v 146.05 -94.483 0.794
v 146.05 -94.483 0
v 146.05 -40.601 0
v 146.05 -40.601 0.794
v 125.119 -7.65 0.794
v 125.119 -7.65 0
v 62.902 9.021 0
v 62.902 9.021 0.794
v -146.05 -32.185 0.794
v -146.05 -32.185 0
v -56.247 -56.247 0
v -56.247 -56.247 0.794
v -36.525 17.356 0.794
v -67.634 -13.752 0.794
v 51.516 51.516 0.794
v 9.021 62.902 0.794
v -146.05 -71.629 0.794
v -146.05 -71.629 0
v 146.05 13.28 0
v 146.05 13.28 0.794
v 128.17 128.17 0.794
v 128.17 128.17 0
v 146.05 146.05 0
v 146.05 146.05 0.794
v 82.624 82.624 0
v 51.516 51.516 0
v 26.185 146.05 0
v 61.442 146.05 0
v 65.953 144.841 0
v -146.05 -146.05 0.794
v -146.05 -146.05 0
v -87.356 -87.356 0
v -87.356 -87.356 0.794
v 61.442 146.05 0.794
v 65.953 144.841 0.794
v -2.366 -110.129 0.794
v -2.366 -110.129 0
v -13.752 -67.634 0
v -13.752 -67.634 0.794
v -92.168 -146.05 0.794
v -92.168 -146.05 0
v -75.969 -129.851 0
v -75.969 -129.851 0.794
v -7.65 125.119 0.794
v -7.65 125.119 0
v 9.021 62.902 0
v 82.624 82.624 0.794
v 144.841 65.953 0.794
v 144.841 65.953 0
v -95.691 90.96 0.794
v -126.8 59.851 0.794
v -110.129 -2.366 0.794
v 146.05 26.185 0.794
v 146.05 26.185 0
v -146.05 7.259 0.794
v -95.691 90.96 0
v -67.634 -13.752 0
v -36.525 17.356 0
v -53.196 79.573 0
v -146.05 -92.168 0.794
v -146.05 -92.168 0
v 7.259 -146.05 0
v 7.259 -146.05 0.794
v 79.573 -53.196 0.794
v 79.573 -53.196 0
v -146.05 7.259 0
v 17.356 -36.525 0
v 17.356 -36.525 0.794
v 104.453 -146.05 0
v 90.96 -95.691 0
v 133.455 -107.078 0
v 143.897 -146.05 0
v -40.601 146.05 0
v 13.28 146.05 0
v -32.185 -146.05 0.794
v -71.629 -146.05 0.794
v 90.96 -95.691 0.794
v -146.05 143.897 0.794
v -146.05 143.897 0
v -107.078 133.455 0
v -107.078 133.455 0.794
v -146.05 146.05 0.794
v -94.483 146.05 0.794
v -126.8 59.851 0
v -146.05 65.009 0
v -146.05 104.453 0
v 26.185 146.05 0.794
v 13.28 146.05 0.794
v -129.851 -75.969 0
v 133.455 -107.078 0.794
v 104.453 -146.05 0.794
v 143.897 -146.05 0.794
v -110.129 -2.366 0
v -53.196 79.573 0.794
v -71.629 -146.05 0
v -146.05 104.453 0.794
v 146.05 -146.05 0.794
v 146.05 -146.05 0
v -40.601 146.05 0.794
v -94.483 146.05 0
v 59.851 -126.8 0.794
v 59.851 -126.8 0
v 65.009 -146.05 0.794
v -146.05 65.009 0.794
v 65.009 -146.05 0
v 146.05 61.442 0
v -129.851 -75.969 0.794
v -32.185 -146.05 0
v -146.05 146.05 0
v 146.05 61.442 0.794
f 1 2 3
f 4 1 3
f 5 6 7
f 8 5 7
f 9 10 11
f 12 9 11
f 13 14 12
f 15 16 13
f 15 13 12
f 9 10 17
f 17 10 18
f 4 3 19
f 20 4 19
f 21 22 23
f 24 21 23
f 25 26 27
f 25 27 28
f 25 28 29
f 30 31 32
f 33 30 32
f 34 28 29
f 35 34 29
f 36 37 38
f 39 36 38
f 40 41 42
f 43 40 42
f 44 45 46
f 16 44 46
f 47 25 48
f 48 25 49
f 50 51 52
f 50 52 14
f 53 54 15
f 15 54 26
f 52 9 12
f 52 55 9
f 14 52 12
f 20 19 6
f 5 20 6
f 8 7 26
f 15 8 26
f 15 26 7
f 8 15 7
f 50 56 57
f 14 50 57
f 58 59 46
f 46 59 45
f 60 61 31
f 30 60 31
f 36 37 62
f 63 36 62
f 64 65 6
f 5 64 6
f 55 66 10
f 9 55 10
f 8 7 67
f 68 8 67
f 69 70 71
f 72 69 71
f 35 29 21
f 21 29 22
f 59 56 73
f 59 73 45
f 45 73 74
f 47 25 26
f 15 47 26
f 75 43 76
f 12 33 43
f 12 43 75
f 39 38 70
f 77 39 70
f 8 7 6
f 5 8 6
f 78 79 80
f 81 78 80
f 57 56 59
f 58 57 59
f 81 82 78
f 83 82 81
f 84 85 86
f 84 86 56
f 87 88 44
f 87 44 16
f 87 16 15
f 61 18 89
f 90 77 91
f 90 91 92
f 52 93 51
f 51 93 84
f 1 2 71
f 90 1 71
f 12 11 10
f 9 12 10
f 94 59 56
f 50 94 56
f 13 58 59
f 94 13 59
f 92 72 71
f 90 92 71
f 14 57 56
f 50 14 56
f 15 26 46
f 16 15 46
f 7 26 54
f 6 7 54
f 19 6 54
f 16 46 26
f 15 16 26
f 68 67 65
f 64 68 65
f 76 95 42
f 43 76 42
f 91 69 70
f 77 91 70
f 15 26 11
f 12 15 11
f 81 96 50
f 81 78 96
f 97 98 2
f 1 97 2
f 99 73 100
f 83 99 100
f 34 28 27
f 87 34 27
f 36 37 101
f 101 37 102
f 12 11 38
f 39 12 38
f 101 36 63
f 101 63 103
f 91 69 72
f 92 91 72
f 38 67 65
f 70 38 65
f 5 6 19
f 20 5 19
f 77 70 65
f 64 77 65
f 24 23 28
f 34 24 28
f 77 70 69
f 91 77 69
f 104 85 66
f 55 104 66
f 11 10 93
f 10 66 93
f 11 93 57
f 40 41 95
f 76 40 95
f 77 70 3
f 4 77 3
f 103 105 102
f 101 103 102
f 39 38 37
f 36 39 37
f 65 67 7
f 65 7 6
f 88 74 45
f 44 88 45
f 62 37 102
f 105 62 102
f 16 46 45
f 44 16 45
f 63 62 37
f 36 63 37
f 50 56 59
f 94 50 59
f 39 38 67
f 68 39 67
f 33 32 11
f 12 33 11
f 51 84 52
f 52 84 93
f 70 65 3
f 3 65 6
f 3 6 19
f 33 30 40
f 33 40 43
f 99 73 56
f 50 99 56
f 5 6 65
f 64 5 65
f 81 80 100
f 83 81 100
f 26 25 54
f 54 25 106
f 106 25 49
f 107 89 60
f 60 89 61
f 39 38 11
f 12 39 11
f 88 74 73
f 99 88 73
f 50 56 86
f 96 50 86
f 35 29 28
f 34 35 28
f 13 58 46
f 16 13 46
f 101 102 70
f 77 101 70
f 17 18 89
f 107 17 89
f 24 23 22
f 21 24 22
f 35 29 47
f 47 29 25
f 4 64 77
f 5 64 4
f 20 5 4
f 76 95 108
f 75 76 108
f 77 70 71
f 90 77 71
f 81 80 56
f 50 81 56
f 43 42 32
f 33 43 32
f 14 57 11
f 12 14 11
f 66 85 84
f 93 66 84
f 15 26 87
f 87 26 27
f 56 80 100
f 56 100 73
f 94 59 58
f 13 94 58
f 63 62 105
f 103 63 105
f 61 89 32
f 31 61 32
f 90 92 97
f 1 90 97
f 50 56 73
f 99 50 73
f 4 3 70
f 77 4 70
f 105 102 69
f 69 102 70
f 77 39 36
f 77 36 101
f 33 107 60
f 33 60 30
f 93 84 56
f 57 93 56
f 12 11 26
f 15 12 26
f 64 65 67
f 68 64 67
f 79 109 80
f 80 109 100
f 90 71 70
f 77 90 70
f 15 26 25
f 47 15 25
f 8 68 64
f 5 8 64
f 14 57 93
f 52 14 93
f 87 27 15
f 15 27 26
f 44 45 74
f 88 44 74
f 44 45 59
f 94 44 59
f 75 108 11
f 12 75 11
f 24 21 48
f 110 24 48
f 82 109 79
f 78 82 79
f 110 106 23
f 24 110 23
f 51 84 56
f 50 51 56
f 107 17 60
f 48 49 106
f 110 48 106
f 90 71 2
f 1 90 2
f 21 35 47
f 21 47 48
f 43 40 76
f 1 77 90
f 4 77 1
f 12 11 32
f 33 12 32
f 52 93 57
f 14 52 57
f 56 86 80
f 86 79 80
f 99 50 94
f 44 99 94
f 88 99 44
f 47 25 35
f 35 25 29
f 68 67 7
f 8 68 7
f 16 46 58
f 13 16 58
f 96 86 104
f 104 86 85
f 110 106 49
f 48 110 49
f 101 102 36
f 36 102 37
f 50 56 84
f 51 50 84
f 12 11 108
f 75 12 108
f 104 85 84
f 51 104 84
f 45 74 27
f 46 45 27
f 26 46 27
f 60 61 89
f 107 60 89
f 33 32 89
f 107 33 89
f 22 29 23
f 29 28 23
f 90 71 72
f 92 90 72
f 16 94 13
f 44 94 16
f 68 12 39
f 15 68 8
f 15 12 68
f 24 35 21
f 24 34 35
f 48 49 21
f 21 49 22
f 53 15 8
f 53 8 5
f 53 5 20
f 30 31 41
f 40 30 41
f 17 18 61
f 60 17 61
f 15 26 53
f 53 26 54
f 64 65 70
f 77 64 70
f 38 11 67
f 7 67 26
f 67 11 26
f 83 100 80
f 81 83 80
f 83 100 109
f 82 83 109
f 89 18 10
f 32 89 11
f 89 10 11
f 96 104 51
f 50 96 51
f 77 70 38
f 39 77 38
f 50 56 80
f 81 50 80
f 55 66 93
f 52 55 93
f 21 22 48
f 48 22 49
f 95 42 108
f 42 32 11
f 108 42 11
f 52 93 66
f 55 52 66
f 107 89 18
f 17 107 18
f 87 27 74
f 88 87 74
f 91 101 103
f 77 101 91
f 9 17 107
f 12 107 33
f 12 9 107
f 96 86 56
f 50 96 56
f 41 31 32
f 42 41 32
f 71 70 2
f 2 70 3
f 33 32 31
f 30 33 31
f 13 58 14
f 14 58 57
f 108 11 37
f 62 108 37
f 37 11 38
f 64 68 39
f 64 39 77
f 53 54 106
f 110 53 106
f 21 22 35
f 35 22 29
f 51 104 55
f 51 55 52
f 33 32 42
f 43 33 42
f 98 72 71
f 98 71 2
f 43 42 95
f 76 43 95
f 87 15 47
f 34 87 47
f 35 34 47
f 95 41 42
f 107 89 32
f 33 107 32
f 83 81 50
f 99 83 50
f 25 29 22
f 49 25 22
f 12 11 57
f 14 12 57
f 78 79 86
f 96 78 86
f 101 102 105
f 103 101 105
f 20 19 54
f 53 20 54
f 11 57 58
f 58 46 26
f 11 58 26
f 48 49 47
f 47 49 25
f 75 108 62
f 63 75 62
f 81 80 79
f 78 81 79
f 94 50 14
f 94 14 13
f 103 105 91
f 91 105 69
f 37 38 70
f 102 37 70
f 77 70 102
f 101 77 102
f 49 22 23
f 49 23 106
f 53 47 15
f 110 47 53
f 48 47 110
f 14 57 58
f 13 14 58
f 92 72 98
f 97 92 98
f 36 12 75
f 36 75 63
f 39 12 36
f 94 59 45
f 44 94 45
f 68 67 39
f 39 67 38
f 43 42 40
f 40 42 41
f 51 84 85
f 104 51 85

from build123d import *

# Parameters (mm, degrees)
F1_DEPTH = 0.79375
F2_DEPTH = 0.79375
F3_DEPTH = 0.79375


with BuildPart() as f1:
    # F0 (on Top) → F1 (new body)
    with BuildSketch(Plane.XY):
        Polygon((-7.6503990469, 125.1191826267), (13.2804183263, 146.05), (-40.6011184001, 146.05), (-95.6914612629, 90.9596571371), (-53.1964330331, 79.5731486406), align=None)
    extrude(amount=F1_DEPTH)


with BuildPart() as f1b:
    # F0 (on Top) → F1, piece 2 (new body)
    with BuildSketch(Plane.XY):
        Polygon((-67.6339472858, -13.7524105594), (-95.6914612629, 90.9596571371), (-126.7999809963, 59.8511374038), (-110.1289755157, -2.3659020629), align=None)
    extrude(amount=F1_DEPTH)


with BuildPart() as f1c:
    # F0 (on Top) → F1, piece 3 (new body)
    with BuildSketch(Plane.XY):
        Polygon((-146.05, 104.4531869238), (-95.6914612629, 90.9596571371), (-107.0779697595, 133.454685367), (-146.05, 143.8972093974), align=None)
    extrude(amount=F1_DEPTH)


with BuildPart() as f1d:
    # F0 (on Top) → F1, piece 4 (new body)
    with BuildSketch(Plane.XY):
        Polygon((-75.9694500261, -129.8509867525), (-87.3559585227, -87.3559585227), (-146.05, -146.05), (-92.1684632736, -146.05), align=None)
    extrude(amount=F1_DEPTH)


with BuildPart() as f1e:
    # F0 (on Top) → F1, piece 5 (new body)
    with BuildSketch(Plane.XY):
        Polygon((17.3561091739, -36.5254275525), (-13.7524105594, -67.6339472858), (90.9596571371, -95.6914612629), (79.5731486406, -53.1964330331), align=None)
    extrude(amount=F1_DEPTH)


with BuildPart() as f1f:
    # F0 (on Top) → F1, piece 6 (new body)
    with BuildSketch(Plane.XY):
        Polygon((146.05, -94.4826551265), (146.05, -40.6011184001), (90.9596571371, -95.6914612629), (133.454685367, -107.0779697595), align=None)
    extrude(amount=F1_DEPTH)


with BuildPart() as f1g:
    # F0 (on Top) → F1, piece 7 (new body)
    with BuildSketch(Plane.XY):
        Polygon((104.4531869238, -146.05), (90.9596571371, -95.6914612629), (59.8511374038, -126.7999809963), (65.0091644501, -146.05), align=None)
    extrude(amount=F1_DEPTH)


with BuildPart() as f1h:
    # F0 (on Top) → F1, piece 8 (new body)
    with BuildSketch(Plane.XY):
        Polygon((-56.2474387893, -56.2474387893), (51.5156346635, 51.5156346635), (9.0206064336, 62.9021431601), (-36.5254275525, 17.3561091739), (-67.6339472858, -13.7524105594), align=None)
    extrude(amount=F1_DEPTH)


with BuildPart() as f1i:
    # F0 (on Top) → F1, piece 9 (new body)
    with BuildSketch(Plane.XY):
        Polygon((-13.7524105594, -67.6339472858), (-56.2474387893, -56.2474387893), (-32.1849150347, -146.05), (7.259107439, -146.05), (-2.3659020629, -110.1289755157), align=None)
    extrude(amount=F1_DEPTH)


with BuildPart() as f1j:
    # F0 (on Top) → F1, piece 10 (new body)
    with BuildSketch(Plane.XY):
        Polygon((-87.3559585227, -87.3559585227), (-56.2474387893, -56.2474387893), (-146.05, -32.1849150347), (-146.05, -71.6289375083), (-129.8509867525, -75.9694500261), align=None)
    extrude(amount=F1_DEPTH)


with BuildPart() as f1k:
    # F0 (on Top) → F1, piece 11 (new body)
    with BuildSketch(Plane.XY):
        Polygon((146.05, 13.2804183263), (146.05, 26.1852278146), (51.5156346635, 51.5156346635), (62.9021431601, 9.0206064336), (125.1191826267, -7.6503990469), align=None)
    extrude(amount=F1_DEPTH)


with BuildPart() as f1l:
    # F0 (on Top) → F1, piece 12 (new body)
    with BuildSketch(Plane.XY):
        Polygon((65.9531489163, 144.8411938636), (61.4418229986, 146.05), (26.1852278146, 146.05), (51.5156346635, 51.5156346635), (82.6241543969, 82.6241543969), align=None)
    extrude(amount=F1_DEPTH)


with BuildPart() as f1m:
    # F0 (on Top) → F1, piece 13 (new body)
    with BuildSketch(Plane.XY):
        Polygon((146.05, 61.4418229986), (146.05, 146.05), (128.170188383, 128.170188383), (144.8411938636, 65.9531489163), align=None)
    extrude(amount=F1_DEPTH)


with BuildPart() as f2:
    # F0 (on Top) → F2 (new body)
    with BuildSketch(Plane.XY):
        Polygon((-95.6914612629, 90.9596571371), (-40.6011184001, 146.05), (-94.4826551265, 146.05), (-107.0779697595, 133.454685367), align=None)
    extrude(amount=F2_DEPTH)


with BuildPart() as f2b:
    # F0 (on Top) → F2, piece 2 (new body)
    with BuildSketch(Plane.XY):
        Polygon((-126.7999809963, 59.8511374038), (-95.6914612629, 90.9596571371), (-146.05, 104.4531869238), (-146.05, 65.0091644501), align=None)
    extrude(amount=F2_DEPTH)


with BuildPart() as f2c:
    # F0 (on Top) → F2, piece 3 (new body)
    with BuildSketch(Plane.XY):
        Polygon((-53.1964330331, 79.5731486406), (-95.6914612629, 90.9596571371), (-67.6339472858, -13.7524105594), (-36.5254275525, 17.3561091739), align=None)
    extrude(amount=F2_DEPTH)


with BuildPart() as f2d:
    # F0 (on Top) → F2, piece 4 (new body)
    with BuildSketch(Plane.XY):
        Polygon((-146.05, -32.1849150347), (-56.2474387893, -56.2474387893), (-67.6339472858, -13.7524105594), (-110.1289755157, -2.3659020629), (-146.05, 7.259107439), align=None)
    extrude(amount=F2_DEPTH)


with BuildPart() as f2e:
    # F0 (on Top) → F2, piece 5 (new body)
    with BuildSketch(Plane.XY):
        Polygon((-146.05, -146.05), (-87.3559585227, -87.3559585227), (-129.8509867525, -75.9694500261), (-146.05, -92.1684632736), align=None)
    extrude(amount=F2_DEPTH)


with BuildPart() as f2f:
    # F0 (on Top) → F2, piece 6 (new body)
    with BuildSketch(Plane.XY):
        Polygon((-32.1849150347, -146.05), (-56.2474387893, -56.2474387893), (-87.3559585227, -87.3559585227), (-75.9694500261, -129.8509867525), (-71.6289375083, -146.05), align=None)
    extrude(amount=F2_DEPTH)


with BuildPart() as f2g:
    # F0 (on Top) → F2, piece 7 (new body)
    with BuildSketch(Plane.XY):
        Polygon((62.9021431601, 9.0206064336), (51.5156346635, 51.5156346635), (-56.2474387893, -56.2474387893), (-13.7524105594, -67.6339472858), (17.3561091739, -36.5254275525), align=None)
    extrude(amount=F2_DEPTH)


with BuildPart() as f2h:
    # F0 (on Top) → F2, piece 8 (new body)
    with BuildSketch(Plane.XY):
        Polygon((90.9596571371, -95.6914612629), (-13.7524105594, -67.6339472858), (-2.3659020629, -110.1289755157), (59.8511374038, -126.7999809963), align=None)
    extrude(amount=F2_DEPTH)


with BuildPart() as f2i:
    # F0 (on Top) → F2, piece 9 (new body)
    with BuildSketch(Plane.XY):
        Polygon((133.454685367, -107.0779697595), (90.9596571371, -95.6914612629), (104.4531869238, -146.05), (143.8972093974, -146.05), align=None)
    extrude(amount=F2_DEPTH)


with BuildPart() as f2j:
    # F0 (on Top) → F2, piece 10 (new body)
    with BuildSketch(Plane.XY):
        Polygon((146.05, -40.6011184001), (146.05, 13.2804183263), (125.1191826267, -7.6503990469), (79.5731486406, -53.1964330331), (90.9596571371, -95.6914612629), align=None)
    extrude(amount=F2_DEPTH)


with BuildPart() as f2k:
    # F0 (on Top) → F2, piece 11 (new body)
    with BuildSketch(Plane.XY):
        Polygon((146.05, 26.1852278146), (146.05, 61.4418229986), (144.8411938636, 65.9531489163), (82.6241543969, 82.6241543969), (51.5156346635, 51.5156346635), align=None)
    extrude(amount=F2_DEPTH)


with BuildPart() as f2l:
    # F0 (on Top) → F2, piece 12 (new body)
    with BuildSketch(Plane.XY):
        Polygon((51.5156346635, 51.5156346635), (26.1852278146, 146.05), (13.2804183263, 146.05), (-7.6503990469, 125.1191826267), (9.0206064336, 62.9021431601), align=None)
    extrude(amount=F2_DEPTH)


with BuildPart() as f2m:
    # F0 (on Top) → F2, piece 13 (new body)
    with BuildSketch(Plane.XY):
        Polygon((128.170188383, 128.170188383), (146.05, 146.05), (61.4418229986, 146.05), (65.9531489163, 144.8411938636), align=None)
    extrude(amount=F2_DEPTH)


with BuildPart() as f3:
    # F0 (on Top) → F3 (new body)
    with BuildSketch(Plane.XY):
        Polygon((-107.0779697595, 133.454685367), (-94.4826551265, 146.05), (-146.05, 146.05), (-146.05, 143.8972093974), align=None)
    extrude(amount=F3_DEPTH)


with BuildPart() as f3b:
    # F0 (on Top) → F3, piece 2 (new body)
    with BuildSketch(Plane.XY):
        Polygon((-110.1289755157, -2.3659020629), (-126.7999809963, 59.8511374038), (-146.05, 65.0091644501), (-146.05, 7.259107439), align=None)
    extrude(amount=F3_DEPTH)


with BuildPart() as f3c:
    # F0 (on Top) → F3, piece 3 (new body)
    with BuildSketch(Plane.XY):
        Polygon((9.0206064336, 62.9021431601), (-7.6503990469, 125.1191826267), (-53.1964330331, 79.5731486406), (-36.5254275525, 17.3561091739), align=None)
    extrude(amount=F3_DEPTH)


with BuildPart() as f3d:
    # F0 (on Top) → F3, piece 4 (new body)
    with BuildSketch(Plane.XY):
        Polygon((144.8411938636, 65.9531489163), (128.170188383, 128.170188383), (65.9531489163, 144.8411938636), (82.6241543969, 82.6241543969), align=None)
    extrude(amount=F3_DEPTH)


with BuildPart() as f3e:
    # F0 (on Top) → F3, piece 5 (new body)
    with BuildSketch(Plane.XY):
        Polygon((125.1191826267, -7.6503990469), (62.9021431601, 9.0206064336), (17.3561091739, -36.5254275525), (79.5731486406, -53.1964330331), align=None)
    extrude(amount=F3_DEPTH)


with BuildPart() as f3f:
    # F0 (on Top) → F3, piece 6 (new body)
    with BuildSketch(Plane.XY):
        Polygon((146.05, -146.05), (146.05, -94.4826551265), (133.454685367, -107.0779697595), (143.8972093974, -146.05), align=None)
    extrude(amount=F3_DEPTH)


with BuildPart() as f3g:
    # F0 (on Top) → F3, piece 7 (new body)
    with BuildSketch(Plane.XY):
        Polygon((-2.3659020629, -110.1289755157), (7.259107439, -146.05), (65.0091644501, -146.05), (59.8511374038, -126.7999809963), align=None)
    extrude(amount=F3_DEPTH)


with BuildPart() as f3h:
    # F0 (on Top) → F3, piece 8 (new body)
    with BuildSketch(Plane.XY):
        Polygon((-71.6289375083, -146.05), (-75.9694500261, -129.8509867525), (-92.1684632736, -146.05), align=None)
    extrude(amount=F3_DEPTH)


with BuildPart() as f3i:
    # F0 (on Top) → F3, piece 9 (new body)
    with BuildSketch(Plane.XY):
        Polygon((-146.05, -92.1684632736), (-129.8509867525, -75.9694500261), (-146.05, -71.6289375083), align=None)
    extrude(amount=F3_DEPTH)


solid = Compound([f1.part, f1b.part, f1c.part, f1d.part, f1e.part, f1f.part, f1g.part, f1h.part, f1i.part, f1j.part, f1k.part, f1l.part, f1m.part, f2.part, f2b.part, f2c.part, f2d.part, f2e.part, f2f.part, f2g.part, f2h.part, f2i.part, f2j.part, f2k.part, f2l.part, f2m.part, f3.part, f3b.part, f3c.part, f3d.part, f3e.part, f3f.part, f3g.part, f3h.part, f3i.part])
